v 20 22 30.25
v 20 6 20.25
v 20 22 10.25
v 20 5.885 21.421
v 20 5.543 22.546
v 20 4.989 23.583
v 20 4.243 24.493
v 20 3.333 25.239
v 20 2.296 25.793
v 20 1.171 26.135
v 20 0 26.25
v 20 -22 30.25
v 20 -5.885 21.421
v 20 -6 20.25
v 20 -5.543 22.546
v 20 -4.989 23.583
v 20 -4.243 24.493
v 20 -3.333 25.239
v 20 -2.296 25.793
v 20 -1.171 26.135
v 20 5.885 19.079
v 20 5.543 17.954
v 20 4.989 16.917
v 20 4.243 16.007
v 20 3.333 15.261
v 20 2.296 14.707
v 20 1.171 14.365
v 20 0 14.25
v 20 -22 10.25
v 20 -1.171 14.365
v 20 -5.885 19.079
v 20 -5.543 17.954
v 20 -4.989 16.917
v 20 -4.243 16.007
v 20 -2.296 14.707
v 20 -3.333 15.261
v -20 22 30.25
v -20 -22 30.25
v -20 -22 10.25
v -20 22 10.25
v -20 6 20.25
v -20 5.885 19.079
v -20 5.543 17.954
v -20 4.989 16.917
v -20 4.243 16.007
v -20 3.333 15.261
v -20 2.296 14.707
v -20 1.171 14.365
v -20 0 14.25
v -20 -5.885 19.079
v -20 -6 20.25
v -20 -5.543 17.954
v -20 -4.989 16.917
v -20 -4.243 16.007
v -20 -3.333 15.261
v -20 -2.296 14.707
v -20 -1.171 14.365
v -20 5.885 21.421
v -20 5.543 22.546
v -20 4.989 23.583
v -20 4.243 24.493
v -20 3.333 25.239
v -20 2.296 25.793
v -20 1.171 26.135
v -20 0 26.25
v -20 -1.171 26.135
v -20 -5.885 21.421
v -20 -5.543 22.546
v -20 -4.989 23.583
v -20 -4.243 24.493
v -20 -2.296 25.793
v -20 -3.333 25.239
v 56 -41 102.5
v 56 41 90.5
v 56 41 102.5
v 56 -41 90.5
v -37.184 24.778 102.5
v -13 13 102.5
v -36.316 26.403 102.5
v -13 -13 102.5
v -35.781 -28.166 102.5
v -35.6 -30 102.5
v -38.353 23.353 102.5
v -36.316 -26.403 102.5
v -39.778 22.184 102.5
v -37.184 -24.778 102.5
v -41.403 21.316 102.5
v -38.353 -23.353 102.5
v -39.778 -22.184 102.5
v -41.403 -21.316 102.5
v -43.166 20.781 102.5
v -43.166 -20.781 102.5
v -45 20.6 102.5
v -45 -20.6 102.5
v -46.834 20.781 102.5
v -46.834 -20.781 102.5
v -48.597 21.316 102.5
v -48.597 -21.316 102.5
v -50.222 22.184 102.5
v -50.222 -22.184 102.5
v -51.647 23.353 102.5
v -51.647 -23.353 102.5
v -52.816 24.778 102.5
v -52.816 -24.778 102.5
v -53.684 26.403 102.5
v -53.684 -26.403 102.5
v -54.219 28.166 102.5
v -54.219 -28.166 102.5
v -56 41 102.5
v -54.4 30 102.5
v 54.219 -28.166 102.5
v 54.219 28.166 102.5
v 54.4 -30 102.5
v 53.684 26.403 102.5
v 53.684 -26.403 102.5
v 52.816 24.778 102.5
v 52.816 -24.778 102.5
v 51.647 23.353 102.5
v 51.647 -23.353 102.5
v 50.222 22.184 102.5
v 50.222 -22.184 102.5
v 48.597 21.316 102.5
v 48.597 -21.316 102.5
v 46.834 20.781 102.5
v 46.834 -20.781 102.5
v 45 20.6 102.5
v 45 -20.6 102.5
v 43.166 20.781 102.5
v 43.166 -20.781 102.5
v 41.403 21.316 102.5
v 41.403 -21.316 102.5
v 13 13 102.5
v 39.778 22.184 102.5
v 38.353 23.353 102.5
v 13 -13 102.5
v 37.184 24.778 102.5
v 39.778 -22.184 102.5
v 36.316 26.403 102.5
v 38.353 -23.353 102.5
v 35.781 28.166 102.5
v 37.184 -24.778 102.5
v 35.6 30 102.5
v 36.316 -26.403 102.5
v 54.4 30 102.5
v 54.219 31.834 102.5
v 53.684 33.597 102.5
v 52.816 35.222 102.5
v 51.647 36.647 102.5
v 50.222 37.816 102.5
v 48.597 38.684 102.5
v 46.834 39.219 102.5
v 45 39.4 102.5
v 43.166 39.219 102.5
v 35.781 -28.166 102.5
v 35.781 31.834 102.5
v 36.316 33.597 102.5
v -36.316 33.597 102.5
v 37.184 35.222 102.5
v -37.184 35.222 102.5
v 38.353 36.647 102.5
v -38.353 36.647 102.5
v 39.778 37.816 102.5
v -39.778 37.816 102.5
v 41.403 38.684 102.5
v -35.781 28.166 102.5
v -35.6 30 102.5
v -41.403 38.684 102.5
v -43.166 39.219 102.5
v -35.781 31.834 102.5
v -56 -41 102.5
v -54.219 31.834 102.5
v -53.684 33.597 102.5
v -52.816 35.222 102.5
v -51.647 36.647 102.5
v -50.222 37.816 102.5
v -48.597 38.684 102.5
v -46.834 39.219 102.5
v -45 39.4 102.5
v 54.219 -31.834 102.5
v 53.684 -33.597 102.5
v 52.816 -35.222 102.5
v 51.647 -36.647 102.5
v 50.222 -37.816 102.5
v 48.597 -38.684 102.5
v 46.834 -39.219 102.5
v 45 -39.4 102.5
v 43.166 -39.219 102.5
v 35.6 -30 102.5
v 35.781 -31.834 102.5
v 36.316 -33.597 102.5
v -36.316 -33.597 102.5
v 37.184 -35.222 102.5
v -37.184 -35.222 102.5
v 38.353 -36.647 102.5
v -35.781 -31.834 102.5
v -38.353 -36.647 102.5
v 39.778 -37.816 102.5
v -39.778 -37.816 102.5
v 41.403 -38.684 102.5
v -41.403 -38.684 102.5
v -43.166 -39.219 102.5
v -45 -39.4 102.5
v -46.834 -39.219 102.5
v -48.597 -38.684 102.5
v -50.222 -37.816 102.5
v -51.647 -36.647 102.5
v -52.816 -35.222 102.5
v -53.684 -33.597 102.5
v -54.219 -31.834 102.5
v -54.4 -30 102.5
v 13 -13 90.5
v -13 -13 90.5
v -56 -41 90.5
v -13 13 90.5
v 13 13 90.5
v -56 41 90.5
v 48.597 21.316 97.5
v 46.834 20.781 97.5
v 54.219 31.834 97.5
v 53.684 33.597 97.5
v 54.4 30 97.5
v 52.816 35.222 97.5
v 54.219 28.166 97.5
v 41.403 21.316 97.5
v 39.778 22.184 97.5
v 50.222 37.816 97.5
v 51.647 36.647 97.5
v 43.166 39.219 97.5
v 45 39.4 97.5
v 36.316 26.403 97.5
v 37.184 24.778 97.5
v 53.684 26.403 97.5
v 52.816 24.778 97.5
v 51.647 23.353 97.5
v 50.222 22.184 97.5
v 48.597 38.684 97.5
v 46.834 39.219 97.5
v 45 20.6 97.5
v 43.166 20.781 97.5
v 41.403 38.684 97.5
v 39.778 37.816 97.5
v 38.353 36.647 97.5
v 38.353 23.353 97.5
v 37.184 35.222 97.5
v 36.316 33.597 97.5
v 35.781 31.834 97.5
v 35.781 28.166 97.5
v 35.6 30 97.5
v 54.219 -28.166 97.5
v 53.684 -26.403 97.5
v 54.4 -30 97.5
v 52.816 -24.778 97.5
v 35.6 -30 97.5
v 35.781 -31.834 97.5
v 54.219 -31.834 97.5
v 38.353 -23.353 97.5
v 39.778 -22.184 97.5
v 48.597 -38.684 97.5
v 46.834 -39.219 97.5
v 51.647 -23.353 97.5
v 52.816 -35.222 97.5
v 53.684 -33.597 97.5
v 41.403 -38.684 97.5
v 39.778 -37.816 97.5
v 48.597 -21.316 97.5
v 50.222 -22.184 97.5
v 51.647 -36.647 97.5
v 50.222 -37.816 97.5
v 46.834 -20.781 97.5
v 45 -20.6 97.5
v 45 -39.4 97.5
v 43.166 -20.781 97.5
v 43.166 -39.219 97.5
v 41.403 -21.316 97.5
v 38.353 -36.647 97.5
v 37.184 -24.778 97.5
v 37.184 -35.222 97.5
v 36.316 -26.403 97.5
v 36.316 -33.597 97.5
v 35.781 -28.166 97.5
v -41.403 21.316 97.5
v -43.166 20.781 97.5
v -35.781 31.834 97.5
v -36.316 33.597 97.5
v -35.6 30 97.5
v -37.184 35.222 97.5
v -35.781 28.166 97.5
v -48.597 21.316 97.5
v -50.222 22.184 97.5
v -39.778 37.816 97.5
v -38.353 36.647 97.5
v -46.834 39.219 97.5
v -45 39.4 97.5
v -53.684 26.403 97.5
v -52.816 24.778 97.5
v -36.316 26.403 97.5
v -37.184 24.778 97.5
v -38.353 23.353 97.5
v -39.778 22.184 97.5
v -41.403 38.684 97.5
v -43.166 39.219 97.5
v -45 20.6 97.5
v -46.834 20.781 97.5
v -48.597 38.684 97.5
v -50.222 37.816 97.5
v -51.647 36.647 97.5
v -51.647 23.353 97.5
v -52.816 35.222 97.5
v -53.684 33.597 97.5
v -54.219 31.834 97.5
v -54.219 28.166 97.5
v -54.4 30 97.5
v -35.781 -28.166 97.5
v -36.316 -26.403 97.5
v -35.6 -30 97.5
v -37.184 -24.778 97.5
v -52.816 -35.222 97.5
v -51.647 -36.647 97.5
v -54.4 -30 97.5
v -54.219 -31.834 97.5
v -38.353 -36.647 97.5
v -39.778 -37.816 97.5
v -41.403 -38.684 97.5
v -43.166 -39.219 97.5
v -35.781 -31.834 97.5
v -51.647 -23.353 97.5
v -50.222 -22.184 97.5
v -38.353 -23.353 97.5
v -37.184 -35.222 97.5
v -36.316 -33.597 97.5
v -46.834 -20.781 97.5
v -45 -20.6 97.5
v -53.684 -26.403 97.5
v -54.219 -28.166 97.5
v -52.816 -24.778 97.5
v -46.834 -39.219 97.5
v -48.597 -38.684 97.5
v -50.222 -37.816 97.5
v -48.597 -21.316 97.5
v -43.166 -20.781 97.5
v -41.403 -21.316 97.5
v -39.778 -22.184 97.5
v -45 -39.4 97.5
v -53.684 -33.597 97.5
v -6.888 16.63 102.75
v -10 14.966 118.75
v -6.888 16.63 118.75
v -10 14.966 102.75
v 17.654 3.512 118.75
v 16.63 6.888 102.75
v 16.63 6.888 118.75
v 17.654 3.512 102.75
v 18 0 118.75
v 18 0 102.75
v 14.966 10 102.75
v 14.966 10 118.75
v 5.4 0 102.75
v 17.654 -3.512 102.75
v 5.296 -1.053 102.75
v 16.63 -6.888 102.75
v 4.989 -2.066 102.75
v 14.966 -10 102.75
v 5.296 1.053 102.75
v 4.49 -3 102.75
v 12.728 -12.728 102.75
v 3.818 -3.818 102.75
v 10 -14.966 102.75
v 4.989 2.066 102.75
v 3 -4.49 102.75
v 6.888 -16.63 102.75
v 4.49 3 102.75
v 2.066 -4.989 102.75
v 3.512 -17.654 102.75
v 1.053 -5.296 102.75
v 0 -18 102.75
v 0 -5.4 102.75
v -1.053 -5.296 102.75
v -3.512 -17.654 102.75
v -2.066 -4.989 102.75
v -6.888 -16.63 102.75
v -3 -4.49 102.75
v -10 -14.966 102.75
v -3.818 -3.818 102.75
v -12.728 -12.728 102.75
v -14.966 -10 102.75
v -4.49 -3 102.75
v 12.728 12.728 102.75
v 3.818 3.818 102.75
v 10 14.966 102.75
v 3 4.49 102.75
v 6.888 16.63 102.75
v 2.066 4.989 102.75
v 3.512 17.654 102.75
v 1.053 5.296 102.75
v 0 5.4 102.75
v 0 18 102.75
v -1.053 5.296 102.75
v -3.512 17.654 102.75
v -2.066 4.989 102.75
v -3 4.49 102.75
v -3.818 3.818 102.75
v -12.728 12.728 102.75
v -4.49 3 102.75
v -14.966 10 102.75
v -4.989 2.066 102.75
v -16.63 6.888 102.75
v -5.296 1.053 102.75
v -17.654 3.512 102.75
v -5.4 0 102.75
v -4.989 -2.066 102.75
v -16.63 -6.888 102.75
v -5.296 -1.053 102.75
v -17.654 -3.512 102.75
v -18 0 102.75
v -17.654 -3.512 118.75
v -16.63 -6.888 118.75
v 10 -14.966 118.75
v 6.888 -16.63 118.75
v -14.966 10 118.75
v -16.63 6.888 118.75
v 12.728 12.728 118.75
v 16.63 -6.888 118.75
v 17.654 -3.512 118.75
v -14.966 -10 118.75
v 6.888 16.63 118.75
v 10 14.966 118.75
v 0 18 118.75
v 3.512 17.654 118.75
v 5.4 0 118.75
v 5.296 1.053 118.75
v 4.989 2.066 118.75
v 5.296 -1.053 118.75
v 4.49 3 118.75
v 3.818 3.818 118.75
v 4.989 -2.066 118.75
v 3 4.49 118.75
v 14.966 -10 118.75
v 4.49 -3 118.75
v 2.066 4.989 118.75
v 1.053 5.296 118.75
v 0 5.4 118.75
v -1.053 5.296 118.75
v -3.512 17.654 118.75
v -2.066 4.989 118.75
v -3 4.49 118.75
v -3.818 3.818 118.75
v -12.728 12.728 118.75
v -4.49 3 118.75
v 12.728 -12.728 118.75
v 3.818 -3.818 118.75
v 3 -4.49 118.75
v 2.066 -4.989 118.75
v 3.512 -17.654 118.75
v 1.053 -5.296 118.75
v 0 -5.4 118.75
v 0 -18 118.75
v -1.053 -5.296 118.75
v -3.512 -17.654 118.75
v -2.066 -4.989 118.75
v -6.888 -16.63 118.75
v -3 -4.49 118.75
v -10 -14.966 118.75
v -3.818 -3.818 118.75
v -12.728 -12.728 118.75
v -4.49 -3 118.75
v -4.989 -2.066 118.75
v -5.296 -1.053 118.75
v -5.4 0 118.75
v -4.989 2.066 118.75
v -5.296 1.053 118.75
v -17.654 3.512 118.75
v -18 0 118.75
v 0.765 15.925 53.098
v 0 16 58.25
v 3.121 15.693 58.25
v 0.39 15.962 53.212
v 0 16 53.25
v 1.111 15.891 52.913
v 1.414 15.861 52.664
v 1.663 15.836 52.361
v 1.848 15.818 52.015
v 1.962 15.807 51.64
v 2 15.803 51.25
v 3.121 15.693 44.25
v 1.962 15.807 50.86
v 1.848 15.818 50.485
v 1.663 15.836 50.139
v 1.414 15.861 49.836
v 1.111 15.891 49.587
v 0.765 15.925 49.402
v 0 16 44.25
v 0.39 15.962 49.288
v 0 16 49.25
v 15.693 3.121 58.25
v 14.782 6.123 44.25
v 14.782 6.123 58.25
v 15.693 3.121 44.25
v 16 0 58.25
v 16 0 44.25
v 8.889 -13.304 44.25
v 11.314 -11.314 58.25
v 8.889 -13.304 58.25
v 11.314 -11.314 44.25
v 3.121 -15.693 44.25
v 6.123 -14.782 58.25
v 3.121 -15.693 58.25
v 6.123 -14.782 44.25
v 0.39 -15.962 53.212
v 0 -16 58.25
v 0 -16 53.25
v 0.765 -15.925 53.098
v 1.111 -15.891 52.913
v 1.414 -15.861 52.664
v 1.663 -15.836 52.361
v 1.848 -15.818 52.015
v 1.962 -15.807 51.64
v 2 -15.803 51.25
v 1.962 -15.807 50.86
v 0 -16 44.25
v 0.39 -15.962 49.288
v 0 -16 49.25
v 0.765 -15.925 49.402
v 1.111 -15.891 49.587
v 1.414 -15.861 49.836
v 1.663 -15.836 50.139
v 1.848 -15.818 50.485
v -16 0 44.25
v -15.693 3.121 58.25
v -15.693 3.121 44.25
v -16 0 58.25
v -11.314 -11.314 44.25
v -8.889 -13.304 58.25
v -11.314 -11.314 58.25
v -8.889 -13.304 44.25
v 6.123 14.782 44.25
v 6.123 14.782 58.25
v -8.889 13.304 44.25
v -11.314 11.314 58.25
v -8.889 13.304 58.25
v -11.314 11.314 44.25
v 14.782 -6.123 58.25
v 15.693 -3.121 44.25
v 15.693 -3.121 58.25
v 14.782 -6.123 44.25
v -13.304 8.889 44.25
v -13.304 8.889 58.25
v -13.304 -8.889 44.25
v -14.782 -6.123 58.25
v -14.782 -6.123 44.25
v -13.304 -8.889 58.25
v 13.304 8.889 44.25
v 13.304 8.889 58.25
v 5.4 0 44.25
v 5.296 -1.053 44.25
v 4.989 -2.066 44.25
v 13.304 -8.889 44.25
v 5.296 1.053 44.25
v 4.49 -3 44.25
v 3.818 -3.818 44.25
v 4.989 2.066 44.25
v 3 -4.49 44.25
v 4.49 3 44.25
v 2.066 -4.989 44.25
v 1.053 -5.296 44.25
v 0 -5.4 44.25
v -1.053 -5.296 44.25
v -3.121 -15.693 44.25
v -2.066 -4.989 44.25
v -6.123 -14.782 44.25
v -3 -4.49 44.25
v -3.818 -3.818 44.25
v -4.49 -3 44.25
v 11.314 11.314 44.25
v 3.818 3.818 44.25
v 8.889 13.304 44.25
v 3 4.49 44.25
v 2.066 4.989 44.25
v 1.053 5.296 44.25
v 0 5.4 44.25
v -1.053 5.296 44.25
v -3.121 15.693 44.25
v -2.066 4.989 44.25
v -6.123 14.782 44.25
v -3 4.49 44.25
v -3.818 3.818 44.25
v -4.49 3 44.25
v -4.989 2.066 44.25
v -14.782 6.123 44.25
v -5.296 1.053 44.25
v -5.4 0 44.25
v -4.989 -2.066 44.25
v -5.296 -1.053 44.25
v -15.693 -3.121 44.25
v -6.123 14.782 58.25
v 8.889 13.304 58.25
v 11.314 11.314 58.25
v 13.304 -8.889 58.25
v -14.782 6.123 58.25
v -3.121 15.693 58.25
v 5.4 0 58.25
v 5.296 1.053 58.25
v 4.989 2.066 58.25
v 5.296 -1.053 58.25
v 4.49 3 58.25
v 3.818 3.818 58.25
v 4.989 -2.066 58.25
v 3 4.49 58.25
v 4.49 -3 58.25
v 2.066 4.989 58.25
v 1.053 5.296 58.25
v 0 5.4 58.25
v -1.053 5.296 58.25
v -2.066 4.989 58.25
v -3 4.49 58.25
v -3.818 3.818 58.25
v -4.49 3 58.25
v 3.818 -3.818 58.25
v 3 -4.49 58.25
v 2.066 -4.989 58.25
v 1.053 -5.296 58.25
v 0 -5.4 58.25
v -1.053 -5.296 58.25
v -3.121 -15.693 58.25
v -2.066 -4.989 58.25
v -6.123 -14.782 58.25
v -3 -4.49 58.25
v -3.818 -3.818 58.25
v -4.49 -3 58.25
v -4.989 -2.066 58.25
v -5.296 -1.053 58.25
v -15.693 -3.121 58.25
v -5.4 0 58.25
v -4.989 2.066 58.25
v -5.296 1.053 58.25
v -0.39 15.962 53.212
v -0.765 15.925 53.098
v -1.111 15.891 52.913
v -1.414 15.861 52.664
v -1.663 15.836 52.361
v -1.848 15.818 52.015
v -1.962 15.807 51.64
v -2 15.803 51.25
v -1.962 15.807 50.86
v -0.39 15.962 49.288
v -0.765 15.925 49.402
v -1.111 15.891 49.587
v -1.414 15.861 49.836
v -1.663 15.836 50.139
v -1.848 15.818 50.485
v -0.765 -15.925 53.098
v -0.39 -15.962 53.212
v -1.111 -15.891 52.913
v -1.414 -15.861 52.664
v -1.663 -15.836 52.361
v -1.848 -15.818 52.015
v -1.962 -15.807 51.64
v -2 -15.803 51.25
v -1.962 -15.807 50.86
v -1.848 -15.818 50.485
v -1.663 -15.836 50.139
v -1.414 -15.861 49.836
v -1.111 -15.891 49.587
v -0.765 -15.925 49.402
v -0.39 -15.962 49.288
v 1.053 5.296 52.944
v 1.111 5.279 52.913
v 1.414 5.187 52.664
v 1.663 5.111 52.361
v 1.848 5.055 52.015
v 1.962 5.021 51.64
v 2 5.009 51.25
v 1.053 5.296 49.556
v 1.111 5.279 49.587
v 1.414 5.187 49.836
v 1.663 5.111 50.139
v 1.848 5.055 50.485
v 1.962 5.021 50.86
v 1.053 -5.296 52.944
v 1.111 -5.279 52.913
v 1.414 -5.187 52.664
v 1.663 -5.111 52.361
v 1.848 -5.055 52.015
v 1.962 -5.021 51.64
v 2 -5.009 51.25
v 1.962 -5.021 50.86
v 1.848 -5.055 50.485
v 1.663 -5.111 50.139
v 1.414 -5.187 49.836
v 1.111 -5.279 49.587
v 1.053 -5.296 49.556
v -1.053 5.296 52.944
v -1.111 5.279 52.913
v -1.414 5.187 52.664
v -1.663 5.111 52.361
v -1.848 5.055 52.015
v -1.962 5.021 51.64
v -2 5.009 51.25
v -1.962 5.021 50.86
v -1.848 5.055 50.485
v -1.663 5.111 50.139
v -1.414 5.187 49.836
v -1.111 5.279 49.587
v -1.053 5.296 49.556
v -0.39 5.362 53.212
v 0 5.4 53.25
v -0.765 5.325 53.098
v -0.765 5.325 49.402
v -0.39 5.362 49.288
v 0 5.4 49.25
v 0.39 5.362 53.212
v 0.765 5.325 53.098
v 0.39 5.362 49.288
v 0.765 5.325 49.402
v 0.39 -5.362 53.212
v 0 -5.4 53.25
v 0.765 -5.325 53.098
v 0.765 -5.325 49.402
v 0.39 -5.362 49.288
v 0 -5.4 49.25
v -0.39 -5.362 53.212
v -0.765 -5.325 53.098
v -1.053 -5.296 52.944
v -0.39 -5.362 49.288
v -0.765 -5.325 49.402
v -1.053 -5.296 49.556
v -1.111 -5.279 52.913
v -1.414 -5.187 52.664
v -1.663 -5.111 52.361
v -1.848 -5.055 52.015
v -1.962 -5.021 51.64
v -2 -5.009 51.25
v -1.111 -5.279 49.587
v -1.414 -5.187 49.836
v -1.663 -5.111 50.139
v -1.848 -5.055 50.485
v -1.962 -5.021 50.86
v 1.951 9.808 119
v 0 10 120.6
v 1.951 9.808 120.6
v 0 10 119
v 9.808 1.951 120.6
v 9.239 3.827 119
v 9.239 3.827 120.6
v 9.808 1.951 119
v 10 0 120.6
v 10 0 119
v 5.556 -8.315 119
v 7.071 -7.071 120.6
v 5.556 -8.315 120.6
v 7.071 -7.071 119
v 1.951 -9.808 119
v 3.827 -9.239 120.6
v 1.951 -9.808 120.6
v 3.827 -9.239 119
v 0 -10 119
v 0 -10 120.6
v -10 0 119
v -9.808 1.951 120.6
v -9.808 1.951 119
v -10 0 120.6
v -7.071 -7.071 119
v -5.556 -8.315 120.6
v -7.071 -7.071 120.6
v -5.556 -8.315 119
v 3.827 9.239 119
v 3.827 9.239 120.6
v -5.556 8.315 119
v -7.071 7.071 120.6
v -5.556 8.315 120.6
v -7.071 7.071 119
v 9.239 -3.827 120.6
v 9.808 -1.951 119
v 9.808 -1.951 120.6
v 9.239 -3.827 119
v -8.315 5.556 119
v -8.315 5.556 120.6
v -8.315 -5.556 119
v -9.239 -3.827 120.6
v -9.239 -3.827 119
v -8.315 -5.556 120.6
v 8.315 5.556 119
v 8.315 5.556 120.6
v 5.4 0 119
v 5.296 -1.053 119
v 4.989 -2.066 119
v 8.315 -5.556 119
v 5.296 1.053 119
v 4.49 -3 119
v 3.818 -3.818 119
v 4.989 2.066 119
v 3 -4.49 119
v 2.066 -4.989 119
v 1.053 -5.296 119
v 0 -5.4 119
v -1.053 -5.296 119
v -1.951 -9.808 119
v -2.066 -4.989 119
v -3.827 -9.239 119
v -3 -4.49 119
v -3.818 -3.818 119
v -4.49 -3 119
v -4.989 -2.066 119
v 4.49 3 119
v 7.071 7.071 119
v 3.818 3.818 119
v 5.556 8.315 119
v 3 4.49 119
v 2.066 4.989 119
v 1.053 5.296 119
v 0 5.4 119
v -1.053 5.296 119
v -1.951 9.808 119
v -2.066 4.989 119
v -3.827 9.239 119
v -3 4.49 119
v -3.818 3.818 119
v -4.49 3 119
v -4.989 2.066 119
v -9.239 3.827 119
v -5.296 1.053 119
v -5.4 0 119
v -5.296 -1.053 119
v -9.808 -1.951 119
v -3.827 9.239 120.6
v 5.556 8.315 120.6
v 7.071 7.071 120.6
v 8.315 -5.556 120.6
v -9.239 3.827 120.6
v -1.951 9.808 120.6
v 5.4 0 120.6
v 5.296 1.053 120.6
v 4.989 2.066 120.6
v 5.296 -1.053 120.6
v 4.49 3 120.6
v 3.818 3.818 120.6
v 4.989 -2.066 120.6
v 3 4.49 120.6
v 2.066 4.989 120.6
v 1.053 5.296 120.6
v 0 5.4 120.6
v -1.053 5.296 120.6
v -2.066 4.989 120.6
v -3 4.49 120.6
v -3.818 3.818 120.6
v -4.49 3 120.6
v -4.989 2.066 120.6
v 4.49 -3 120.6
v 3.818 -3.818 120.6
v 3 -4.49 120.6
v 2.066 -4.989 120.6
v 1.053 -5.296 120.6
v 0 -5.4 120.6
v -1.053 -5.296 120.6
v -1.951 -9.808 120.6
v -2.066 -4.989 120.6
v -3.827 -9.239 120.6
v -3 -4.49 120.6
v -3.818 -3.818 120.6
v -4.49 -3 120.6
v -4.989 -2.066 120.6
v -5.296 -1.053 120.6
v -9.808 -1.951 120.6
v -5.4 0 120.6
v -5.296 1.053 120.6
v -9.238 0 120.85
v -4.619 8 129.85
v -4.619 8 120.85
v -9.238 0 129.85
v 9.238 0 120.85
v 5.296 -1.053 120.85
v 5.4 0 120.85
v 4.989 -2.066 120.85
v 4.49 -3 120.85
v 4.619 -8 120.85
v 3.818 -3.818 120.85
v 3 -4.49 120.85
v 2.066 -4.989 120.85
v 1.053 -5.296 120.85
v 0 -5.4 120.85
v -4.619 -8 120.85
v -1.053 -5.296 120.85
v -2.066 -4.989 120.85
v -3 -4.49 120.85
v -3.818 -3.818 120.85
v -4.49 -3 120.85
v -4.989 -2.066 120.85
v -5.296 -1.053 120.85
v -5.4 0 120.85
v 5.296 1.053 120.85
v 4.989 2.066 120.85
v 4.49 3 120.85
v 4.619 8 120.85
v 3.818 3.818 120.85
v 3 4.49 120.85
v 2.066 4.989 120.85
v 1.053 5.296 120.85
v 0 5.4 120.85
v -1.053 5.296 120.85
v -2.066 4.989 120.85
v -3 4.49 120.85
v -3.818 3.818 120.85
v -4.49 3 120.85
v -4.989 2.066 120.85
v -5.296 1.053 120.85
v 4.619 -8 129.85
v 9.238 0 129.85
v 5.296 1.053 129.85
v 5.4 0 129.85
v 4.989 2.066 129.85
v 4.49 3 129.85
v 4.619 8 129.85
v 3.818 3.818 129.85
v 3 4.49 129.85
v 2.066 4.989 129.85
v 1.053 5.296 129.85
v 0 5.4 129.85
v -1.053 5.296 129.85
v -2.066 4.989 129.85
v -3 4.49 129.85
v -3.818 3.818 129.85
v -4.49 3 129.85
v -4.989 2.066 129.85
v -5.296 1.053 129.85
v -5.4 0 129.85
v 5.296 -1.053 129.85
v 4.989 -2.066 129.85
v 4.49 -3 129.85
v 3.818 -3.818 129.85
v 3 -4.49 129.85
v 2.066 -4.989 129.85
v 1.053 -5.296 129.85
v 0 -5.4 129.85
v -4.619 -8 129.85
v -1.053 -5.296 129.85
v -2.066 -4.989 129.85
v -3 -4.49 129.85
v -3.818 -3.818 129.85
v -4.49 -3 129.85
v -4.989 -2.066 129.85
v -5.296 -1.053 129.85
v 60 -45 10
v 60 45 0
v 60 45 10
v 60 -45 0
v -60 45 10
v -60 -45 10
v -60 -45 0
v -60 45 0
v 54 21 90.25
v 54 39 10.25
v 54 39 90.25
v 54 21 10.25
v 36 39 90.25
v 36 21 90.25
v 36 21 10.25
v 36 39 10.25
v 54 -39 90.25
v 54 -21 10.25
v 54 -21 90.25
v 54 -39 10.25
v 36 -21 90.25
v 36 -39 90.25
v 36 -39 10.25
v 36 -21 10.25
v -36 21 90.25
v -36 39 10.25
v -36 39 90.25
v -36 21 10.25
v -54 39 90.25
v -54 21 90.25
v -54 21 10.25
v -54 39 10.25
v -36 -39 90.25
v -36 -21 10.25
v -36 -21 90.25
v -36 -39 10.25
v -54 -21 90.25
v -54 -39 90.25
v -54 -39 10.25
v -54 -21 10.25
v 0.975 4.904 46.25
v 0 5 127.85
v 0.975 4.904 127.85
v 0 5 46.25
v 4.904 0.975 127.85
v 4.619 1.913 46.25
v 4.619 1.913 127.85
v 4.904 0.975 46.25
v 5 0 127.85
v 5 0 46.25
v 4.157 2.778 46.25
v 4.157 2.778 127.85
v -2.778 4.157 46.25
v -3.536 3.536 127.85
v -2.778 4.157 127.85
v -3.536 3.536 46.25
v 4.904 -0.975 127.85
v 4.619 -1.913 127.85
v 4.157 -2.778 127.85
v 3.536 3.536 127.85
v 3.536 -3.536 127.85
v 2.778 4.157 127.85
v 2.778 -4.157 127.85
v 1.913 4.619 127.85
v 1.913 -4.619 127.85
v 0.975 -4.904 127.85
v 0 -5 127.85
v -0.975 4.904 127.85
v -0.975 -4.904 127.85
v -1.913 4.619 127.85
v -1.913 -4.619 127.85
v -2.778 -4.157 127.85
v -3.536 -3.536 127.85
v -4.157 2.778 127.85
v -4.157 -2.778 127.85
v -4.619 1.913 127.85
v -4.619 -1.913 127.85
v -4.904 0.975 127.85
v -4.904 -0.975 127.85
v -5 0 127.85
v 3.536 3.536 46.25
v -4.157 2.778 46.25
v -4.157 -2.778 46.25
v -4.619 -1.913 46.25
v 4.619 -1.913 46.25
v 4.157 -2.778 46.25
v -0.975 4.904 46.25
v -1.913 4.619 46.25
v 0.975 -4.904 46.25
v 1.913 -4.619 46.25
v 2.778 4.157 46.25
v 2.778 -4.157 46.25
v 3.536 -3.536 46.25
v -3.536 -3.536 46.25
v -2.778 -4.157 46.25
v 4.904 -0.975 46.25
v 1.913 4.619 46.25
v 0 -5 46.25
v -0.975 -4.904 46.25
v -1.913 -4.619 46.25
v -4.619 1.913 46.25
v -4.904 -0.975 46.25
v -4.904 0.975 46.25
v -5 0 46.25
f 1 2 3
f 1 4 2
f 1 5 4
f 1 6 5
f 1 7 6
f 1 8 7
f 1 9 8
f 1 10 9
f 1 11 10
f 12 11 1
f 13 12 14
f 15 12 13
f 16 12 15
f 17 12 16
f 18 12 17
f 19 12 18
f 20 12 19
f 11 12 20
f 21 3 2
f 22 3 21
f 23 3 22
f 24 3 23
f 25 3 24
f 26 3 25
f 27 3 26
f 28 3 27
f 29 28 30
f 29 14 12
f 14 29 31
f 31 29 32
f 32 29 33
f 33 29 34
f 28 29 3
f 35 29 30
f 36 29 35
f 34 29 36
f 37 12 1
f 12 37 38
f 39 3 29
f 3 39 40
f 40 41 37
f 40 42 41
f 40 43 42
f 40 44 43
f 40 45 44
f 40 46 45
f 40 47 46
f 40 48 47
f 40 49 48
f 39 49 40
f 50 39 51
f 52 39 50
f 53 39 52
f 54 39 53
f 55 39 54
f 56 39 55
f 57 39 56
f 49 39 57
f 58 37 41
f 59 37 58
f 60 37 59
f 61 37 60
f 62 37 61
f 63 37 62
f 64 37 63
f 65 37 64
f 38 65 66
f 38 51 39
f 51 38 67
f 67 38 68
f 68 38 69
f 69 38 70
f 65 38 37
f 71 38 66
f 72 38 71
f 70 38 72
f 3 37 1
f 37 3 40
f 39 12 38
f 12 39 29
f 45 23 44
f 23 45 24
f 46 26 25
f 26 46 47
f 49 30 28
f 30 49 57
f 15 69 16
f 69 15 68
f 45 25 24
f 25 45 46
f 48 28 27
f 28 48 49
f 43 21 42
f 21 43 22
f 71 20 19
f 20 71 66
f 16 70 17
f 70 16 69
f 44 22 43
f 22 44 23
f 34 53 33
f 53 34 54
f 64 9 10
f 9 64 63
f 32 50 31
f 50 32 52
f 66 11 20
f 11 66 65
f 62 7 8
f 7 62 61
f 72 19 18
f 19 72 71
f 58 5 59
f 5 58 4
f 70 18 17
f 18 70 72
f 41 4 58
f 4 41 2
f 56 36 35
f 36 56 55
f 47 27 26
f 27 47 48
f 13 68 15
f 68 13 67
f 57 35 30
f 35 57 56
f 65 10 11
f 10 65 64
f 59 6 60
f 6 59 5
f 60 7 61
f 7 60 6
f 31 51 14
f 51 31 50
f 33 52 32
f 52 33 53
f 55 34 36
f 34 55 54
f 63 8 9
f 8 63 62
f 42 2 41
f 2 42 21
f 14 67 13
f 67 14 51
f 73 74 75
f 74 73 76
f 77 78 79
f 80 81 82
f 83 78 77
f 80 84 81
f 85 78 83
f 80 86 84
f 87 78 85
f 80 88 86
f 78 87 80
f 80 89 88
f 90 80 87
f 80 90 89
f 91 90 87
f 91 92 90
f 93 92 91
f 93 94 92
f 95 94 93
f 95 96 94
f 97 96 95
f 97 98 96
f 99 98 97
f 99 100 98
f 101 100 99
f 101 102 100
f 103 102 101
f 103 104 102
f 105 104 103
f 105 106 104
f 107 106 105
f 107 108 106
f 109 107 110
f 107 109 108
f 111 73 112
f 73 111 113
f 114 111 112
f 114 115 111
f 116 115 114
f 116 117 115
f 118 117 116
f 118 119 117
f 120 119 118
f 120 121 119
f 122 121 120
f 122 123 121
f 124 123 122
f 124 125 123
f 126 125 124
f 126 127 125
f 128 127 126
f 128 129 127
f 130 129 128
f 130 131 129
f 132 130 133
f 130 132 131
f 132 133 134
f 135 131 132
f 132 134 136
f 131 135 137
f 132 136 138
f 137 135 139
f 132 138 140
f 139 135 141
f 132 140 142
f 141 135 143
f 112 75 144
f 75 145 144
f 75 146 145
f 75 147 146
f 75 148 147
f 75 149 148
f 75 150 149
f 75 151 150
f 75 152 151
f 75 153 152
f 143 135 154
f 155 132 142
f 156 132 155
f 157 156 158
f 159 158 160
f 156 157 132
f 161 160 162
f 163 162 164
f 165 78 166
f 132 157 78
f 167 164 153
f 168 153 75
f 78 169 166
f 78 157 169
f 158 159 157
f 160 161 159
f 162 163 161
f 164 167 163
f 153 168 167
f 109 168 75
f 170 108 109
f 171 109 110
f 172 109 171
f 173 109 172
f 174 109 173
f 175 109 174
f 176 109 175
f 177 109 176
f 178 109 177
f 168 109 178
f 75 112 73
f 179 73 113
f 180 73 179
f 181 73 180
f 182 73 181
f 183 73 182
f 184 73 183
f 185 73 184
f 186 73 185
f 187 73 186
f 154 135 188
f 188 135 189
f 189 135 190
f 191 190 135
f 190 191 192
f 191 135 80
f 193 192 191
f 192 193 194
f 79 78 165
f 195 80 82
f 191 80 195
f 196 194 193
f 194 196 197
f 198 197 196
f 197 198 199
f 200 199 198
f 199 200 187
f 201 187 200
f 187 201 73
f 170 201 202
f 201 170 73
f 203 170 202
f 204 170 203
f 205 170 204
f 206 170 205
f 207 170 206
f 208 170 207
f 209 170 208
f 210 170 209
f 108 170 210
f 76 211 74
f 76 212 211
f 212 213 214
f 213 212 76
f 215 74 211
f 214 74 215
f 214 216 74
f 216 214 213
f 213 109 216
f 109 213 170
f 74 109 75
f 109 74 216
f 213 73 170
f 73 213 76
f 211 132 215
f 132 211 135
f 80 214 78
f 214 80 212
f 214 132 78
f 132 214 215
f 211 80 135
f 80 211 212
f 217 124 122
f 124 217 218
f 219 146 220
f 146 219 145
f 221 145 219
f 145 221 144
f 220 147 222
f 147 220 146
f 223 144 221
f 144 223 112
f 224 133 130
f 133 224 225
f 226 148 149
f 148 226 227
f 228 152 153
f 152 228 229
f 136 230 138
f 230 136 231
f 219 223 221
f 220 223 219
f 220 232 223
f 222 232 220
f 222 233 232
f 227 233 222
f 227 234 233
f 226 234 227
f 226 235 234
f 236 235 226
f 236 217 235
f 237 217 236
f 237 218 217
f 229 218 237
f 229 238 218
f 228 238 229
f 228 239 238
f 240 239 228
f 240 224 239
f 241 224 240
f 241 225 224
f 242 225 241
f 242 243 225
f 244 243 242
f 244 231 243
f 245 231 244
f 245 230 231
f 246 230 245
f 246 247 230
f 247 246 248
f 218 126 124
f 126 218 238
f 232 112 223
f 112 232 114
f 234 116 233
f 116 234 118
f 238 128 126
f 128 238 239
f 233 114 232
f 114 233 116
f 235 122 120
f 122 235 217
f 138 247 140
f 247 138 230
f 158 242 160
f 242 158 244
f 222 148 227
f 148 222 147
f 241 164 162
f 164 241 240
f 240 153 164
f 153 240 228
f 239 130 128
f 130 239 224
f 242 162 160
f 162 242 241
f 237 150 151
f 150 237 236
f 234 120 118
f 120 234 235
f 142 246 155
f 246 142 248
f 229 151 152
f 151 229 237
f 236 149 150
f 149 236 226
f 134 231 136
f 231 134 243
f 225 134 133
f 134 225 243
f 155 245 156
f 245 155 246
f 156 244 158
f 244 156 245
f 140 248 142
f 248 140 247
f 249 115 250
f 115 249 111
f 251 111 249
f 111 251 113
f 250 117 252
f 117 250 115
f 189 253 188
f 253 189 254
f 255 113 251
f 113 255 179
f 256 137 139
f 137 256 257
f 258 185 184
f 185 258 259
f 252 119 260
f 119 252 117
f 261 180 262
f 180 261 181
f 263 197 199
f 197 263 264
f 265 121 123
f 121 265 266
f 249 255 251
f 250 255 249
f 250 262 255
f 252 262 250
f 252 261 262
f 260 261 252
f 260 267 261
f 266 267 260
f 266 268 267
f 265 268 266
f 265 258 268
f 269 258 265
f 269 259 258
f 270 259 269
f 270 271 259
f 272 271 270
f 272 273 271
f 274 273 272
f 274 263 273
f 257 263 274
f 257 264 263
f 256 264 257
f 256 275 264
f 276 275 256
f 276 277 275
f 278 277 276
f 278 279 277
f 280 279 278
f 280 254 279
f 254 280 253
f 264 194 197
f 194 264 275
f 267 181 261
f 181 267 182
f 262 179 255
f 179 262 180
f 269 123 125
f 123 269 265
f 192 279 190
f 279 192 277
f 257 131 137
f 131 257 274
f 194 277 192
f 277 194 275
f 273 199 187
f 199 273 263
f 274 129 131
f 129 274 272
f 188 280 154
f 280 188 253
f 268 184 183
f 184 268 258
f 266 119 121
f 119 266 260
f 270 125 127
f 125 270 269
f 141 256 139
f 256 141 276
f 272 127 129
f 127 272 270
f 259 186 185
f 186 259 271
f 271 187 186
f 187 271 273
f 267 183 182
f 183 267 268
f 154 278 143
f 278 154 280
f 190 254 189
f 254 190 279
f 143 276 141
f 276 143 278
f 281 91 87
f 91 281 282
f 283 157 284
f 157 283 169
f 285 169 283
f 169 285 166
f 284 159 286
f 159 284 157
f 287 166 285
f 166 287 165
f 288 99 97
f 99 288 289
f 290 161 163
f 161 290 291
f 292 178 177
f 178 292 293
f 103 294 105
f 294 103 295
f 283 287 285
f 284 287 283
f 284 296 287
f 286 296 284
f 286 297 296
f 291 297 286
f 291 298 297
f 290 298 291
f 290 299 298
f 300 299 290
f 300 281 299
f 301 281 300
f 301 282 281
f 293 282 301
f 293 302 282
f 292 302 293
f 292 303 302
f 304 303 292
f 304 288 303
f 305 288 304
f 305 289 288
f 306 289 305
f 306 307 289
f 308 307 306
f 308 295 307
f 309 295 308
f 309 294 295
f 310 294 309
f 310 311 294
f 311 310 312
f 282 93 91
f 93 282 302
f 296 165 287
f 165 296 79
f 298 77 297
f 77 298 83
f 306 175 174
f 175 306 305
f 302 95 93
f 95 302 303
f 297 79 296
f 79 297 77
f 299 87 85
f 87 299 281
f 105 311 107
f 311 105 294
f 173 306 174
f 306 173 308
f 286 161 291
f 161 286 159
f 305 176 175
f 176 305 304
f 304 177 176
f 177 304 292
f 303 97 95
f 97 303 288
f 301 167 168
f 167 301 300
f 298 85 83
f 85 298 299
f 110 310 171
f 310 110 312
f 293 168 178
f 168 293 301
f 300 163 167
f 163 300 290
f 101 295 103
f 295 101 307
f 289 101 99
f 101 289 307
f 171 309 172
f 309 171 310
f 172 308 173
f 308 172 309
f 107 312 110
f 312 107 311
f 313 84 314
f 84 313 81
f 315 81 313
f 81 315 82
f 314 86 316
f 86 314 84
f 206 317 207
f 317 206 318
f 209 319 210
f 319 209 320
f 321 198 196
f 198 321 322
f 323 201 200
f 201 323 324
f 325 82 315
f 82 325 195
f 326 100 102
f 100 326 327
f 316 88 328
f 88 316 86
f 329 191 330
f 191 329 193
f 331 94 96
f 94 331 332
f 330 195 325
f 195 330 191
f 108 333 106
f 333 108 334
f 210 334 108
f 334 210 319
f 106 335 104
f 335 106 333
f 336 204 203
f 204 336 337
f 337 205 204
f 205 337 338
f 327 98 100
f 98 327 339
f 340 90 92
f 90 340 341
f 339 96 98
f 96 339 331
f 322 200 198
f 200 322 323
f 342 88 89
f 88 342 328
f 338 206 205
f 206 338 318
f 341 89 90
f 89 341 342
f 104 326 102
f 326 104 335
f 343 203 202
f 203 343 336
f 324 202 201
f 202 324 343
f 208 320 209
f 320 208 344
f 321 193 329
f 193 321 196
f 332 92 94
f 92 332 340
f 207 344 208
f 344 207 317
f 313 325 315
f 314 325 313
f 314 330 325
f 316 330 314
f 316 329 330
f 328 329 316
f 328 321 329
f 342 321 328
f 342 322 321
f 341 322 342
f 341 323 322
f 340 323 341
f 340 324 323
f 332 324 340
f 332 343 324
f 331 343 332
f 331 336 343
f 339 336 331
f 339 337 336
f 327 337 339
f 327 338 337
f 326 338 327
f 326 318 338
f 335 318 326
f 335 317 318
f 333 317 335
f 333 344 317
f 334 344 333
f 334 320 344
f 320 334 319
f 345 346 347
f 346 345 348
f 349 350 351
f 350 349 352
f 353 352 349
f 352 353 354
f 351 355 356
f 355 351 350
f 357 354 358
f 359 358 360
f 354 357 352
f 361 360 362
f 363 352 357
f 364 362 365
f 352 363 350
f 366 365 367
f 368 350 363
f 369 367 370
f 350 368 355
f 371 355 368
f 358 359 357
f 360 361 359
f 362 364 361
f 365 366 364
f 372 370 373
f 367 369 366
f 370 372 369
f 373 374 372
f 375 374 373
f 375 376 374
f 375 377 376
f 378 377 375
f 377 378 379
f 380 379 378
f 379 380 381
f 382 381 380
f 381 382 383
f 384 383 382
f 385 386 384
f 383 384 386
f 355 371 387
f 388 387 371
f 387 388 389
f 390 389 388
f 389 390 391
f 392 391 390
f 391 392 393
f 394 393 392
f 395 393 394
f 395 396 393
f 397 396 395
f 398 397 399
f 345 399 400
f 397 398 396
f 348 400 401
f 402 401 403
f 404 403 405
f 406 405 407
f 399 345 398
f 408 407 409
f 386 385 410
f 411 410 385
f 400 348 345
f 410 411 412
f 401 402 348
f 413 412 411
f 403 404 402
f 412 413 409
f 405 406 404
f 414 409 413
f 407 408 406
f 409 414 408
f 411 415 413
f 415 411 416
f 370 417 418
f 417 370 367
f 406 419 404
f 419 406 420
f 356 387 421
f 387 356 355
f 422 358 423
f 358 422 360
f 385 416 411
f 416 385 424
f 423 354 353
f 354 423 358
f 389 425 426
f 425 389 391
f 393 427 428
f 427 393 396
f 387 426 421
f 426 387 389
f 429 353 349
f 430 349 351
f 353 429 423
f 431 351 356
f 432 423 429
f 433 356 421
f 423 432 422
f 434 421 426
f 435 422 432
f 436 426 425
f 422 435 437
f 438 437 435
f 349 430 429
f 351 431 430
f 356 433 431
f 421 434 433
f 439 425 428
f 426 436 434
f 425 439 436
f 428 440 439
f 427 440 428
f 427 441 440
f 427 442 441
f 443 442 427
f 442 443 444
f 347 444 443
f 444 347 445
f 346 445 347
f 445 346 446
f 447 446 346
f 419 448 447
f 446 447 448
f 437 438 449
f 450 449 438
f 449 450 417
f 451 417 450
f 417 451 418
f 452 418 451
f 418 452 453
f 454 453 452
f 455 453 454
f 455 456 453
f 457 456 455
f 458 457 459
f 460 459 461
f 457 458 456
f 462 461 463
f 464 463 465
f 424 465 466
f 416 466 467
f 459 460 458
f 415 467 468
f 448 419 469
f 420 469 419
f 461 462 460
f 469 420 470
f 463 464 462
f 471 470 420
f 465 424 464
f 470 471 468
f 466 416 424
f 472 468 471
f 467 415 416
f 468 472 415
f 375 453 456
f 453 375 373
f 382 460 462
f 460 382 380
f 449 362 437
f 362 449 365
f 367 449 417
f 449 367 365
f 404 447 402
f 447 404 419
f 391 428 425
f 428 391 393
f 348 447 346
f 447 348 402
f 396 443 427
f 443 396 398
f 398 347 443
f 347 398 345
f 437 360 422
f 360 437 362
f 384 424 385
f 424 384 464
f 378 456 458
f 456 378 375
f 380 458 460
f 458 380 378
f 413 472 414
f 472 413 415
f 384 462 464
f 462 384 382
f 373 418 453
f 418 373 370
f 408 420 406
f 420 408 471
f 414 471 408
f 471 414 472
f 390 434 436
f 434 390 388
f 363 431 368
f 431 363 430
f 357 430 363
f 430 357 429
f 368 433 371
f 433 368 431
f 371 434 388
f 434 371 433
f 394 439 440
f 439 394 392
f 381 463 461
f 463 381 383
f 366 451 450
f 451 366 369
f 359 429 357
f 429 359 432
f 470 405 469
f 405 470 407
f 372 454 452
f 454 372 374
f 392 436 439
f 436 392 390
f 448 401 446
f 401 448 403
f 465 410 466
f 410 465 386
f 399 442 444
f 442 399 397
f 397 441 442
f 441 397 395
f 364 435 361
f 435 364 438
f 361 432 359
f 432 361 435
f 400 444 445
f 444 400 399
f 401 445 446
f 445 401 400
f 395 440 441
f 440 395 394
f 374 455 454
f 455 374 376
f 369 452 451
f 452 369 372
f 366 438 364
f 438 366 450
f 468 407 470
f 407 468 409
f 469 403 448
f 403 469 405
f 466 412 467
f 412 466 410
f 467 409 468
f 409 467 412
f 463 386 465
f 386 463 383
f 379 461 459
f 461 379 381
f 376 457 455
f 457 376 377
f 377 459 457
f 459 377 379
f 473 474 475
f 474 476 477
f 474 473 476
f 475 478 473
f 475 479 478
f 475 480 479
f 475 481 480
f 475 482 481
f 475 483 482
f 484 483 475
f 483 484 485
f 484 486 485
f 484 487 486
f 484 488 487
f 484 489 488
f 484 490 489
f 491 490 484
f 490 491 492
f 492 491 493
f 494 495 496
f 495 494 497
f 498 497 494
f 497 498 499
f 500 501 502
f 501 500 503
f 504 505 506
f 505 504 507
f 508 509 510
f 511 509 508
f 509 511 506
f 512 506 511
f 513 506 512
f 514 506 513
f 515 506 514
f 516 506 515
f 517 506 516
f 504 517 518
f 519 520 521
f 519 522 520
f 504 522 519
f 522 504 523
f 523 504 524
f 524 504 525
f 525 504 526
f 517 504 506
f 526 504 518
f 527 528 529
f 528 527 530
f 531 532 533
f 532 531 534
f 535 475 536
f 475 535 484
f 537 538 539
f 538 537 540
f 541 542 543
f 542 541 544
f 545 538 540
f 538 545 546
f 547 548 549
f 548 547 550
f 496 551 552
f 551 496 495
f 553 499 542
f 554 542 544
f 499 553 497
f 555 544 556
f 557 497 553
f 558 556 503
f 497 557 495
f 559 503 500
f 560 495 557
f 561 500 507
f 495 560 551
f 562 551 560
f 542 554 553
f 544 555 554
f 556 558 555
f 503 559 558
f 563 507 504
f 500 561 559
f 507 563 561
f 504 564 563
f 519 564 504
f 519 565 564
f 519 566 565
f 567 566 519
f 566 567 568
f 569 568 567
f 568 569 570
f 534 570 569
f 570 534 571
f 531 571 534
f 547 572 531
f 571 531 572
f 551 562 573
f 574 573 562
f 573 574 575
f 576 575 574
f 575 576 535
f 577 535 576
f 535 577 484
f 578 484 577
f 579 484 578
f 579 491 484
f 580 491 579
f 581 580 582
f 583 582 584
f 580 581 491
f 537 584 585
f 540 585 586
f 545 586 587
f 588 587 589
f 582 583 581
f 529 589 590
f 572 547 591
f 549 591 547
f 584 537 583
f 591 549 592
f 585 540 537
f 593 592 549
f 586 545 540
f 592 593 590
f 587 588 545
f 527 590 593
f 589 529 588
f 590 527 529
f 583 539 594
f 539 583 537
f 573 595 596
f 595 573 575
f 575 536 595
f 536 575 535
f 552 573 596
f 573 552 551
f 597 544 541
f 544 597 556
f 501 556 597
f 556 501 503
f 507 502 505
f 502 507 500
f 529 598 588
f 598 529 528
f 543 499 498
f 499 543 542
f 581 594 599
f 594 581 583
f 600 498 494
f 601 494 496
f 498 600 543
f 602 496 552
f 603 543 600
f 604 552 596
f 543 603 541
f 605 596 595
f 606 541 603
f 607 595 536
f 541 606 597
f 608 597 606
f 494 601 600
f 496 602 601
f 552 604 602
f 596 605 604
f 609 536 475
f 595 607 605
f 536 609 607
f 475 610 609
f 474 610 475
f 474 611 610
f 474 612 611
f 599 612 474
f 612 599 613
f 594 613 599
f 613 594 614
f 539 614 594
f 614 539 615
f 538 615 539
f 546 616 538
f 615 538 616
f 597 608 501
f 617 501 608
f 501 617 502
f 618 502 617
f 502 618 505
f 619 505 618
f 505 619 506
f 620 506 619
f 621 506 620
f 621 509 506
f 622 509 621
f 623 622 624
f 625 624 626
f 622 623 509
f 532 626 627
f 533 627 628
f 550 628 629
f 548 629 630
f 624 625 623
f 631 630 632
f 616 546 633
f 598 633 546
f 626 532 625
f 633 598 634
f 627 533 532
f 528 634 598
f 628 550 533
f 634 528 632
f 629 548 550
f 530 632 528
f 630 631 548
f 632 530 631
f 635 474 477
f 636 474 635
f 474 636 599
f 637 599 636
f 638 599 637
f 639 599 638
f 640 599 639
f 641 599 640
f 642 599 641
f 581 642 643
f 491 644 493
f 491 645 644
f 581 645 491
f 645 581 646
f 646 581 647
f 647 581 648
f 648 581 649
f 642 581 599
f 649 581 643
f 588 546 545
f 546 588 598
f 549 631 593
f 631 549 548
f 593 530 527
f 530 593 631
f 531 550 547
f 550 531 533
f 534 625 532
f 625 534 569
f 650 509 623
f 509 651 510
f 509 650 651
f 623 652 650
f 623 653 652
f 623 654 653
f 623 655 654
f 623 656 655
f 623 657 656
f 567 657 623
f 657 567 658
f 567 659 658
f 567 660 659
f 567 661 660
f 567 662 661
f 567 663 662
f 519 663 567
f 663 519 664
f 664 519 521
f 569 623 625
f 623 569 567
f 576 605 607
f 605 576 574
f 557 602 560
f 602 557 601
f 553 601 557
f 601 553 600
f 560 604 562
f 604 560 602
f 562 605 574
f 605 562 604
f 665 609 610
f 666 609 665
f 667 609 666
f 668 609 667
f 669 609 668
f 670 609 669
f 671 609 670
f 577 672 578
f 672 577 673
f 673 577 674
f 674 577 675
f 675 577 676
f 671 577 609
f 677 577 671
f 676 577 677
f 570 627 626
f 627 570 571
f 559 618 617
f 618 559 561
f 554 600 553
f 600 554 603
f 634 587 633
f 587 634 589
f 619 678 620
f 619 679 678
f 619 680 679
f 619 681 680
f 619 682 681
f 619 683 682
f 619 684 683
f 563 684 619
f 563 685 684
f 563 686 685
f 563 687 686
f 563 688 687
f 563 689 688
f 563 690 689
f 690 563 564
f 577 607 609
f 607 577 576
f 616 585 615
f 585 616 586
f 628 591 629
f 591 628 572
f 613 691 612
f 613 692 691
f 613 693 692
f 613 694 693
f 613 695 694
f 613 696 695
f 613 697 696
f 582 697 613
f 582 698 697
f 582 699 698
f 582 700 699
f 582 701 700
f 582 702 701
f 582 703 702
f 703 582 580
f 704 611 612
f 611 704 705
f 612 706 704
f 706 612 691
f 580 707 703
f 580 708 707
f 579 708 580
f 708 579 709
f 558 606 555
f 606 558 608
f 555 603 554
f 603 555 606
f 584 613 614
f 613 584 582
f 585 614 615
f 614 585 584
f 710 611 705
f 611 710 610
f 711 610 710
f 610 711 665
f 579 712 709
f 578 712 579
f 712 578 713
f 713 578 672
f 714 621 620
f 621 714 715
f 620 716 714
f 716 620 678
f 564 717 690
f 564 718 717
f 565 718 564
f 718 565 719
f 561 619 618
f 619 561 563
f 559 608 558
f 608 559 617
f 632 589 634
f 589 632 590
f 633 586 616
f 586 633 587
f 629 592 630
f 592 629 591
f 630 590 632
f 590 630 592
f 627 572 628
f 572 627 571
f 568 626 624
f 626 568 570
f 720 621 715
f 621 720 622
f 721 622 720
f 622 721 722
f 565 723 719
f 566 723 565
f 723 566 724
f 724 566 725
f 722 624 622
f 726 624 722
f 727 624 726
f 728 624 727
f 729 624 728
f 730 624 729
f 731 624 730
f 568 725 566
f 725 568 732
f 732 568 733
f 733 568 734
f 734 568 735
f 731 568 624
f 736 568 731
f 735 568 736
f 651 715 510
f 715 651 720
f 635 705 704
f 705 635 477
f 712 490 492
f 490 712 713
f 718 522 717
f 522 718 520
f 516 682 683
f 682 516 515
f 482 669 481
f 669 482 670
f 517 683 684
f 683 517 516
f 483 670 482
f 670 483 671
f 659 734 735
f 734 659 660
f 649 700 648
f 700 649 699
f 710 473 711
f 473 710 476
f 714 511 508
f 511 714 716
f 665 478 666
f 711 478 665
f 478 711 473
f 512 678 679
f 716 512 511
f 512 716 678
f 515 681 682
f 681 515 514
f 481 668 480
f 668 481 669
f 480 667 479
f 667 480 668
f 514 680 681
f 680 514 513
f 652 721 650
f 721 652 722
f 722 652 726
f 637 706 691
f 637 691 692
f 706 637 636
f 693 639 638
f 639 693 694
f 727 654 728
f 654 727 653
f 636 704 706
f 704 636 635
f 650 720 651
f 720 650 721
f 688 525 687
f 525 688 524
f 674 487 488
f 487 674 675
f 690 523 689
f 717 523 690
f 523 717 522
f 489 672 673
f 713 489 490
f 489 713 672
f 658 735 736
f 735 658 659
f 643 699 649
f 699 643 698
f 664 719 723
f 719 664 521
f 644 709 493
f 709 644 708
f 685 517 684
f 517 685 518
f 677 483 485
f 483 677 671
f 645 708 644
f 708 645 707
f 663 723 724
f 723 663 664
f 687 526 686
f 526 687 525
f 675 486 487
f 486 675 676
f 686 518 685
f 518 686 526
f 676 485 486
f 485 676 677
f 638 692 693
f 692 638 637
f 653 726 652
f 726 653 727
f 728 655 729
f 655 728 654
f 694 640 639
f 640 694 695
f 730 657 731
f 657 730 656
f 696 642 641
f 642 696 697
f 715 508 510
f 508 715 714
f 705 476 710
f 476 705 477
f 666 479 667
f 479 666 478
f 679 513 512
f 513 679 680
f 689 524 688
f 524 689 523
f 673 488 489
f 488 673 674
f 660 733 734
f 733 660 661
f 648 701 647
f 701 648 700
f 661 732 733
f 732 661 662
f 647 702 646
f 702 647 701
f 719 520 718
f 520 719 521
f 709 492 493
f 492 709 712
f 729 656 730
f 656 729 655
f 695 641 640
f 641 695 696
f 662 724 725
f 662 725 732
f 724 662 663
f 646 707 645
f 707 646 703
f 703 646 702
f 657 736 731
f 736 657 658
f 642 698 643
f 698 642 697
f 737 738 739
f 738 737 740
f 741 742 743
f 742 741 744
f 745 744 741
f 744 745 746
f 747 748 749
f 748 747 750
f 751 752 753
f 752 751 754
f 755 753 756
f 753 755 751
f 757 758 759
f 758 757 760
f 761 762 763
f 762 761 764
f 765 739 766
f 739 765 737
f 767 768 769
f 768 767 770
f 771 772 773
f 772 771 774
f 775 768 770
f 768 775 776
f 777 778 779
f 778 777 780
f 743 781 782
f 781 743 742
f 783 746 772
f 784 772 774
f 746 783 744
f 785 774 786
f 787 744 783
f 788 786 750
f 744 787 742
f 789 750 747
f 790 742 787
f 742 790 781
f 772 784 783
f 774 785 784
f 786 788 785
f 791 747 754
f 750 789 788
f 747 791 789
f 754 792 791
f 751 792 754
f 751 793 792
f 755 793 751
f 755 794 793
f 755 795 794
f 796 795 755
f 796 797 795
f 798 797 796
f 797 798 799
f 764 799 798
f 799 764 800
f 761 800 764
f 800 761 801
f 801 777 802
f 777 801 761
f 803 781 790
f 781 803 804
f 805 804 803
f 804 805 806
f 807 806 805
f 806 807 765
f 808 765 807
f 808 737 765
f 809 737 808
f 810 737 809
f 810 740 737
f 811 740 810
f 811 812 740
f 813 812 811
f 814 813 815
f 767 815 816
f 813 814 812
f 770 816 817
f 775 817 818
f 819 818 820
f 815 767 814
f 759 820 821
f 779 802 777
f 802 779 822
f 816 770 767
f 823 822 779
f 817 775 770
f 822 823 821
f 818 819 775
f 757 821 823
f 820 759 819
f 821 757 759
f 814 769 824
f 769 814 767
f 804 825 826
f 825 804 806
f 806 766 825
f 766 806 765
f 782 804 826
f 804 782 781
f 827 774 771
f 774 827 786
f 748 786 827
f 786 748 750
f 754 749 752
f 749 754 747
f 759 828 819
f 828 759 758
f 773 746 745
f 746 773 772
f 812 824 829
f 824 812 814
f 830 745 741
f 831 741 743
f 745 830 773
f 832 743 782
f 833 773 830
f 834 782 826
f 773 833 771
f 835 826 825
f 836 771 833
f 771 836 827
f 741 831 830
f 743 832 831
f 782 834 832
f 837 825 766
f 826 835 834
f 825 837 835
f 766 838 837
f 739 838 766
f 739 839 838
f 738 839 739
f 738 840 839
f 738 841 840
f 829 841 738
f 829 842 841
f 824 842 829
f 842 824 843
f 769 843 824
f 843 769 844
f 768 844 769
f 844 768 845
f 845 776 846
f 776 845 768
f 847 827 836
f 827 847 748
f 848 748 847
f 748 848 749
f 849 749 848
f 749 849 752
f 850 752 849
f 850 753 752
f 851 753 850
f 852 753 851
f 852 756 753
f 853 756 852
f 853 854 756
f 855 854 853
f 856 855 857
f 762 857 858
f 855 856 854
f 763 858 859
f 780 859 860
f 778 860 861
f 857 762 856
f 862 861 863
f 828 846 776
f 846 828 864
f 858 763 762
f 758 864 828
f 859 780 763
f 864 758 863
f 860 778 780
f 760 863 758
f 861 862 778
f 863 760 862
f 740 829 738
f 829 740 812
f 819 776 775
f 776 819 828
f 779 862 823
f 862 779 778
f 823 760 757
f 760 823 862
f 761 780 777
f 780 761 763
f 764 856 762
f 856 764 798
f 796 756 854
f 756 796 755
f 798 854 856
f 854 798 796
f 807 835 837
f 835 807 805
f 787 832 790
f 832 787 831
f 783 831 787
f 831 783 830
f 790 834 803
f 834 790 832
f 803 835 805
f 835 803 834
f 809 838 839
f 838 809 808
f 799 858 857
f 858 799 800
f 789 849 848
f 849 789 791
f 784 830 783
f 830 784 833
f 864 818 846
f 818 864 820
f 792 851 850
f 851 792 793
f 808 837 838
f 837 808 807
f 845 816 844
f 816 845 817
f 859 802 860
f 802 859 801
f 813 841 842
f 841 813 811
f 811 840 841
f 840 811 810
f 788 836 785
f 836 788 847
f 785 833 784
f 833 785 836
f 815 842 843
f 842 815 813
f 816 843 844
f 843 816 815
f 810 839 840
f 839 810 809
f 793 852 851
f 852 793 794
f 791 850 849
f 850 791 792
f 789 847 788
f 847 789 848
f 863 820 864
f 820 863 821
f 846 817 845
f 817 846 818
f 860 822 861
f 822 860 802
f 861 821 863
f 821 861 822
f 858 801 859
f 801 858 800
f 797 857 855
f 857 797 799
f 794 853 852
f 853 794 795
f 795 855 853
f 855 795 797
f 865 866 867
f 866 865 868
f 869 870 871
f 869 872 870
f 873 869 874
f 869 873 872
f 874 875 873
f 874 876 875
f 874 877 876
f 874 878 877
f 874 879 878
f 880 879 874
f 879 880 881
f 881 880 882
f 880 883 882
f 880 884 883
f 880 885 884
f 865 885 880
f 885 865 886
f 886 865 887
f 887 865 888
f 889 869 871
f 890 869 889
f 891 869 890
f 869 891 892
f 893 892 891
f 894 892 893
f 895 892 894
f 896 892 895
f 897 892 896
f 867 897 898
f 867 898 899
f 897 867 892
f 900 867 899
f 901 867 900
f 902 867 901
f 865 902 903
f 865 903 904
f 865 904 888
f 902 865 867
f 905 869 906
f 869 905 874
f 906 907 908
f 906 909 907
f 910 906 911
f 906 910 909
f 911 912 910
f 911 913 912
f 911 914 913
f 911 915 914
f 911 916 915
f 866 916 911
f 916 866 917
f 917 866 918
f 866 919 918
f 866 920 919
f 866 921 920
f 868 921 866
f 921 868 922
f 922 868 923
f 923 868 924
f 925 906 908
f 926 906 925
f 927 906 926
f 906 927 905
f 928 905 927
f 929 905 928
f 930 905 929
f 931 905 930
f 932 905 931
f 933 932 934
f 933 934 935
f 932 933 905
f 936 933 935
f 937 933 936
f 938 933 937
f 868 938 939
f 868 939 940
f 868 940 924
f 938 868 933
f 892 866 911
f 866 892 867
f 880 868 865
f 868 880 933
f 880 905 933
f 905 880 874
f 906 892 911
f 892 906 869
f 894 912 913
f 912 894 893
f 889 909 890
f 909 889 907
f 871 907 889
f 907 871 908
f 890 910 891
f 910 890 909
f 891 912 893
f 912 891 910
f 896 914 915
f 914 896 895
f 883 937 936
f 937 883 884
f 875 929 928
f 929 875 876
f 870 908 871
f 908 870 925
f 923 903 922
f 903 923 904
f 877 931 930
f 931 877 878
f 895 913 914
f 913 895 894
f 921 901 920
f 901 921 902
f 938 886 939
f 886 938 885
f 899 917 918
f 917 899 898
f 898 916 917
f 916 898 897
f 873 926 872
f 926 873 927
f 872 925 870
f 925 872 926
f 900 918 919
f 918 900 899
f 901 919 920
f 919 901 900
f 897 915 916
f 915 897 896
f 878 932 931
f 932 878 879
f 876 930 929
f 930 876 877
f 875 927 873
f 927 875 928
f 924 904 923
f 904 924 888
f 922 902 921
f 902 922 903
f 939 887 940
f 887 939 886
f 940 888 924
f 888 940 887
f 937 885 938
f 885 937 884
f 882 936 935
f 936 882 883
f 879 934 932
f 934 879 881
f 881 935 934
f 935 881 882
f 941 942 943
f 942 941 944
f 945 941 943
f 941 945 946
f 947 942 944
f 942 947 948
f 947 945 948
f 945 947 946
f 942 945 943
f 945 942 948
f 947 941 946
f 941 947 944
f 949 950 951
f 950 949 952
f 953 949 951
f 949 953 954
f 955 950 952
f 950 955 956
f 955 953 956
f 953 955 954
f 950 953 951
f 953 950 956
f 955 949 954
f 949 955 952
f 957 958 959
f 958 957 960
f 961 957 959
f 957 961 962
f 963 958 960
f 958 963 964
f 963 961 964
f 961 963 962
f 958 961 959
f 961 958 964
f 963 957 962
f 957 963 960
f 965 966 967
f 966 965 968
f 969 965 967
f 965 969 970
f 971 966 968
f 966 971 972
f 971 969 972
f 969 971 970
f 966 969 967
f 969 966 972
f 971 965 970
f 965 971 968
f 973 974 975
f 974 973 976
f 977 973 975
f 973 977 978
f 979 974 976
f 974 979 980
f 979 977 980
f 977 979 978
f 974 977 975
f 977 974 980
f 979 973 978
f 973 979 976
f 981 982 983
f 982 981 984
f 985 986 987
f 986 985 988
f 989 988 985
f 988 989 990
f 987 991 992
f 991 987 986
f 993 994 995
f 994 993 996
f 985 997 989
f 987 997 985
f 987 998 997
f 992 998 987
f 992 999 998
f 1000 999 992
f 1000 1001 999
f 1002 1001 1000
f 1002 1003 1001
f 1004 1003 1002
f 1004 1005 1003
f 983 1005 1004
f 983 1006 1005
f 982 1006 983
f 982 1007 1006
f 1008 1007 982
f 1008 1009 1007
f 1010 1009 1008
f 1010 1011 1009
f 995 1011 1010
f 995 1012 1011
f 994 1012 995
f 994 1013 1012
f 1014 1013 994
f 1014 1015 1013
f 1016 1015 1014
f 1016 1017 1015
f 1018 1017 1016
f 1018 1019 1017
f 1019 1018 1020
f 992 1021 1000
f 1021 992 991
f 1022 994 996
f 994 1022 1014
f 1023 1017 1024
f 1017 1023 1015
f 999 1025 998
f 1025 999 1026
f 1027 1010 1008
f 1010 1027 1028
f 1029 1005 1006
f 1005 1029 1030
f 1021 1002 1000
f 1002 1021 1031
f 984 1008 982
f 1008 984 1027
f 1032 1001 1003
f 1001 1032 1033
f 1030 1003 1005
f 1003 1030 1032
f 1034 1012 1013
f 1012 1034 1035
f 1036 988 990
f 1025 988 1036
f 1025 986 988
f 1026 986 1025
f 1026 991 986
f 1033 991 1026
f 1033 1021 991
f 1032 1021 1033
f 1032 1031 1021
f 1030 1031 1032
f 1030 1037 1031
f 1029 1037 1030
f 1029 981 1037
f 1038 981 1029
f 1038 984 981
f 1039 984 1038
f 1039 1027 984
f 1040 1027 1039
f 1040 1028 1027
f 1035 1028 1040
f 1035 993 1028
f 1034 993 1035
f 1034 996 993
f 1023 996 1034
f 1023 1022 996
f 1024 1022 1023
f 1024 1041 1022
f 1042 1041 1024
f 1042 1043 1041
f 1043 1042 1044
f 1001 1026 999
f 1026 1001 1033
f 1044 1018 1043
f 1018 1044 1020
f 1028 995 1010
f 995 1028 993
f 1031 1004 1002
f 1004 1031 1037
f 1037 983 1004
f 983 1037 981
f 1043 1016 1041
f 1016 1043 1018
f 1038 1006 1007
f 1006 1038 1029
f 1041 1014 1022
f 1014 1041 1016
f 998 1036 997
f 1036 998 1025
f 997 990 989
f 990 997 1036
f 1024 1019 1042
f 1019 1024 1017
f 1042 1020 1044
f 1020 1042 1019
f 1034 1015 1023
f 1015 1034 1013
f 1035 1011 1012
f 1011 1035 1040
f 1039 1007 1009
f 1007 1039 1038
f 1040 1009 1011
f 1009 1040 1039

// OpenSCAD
$fn = 32;

// ------------------------------------------------------------------------
// Arbor press fixture: screw d10, posts 80 mm, gap 14 mm
// Every part is its own module, assembly() places every instance.
// ------------------------------------------------------------------------

// --- part 1 ---
module press_bed() {
  difference() {
    translate([-60, -45, 0]) cube([120, 90, 10]);
  }
}

// --- part 2 ---
module anvil_block() {
  difference() {
    translate([-20, -22, 0]) cube([40, 44, 20]);
    translate([0, 0, 10]) rotate([0, 90, 0]) cylinder(h = 42, d = 12, center = true);
  }
}

// --- part 3 ---
module press_post_a() {
  translate([-9, -9, 0]) cube([18, 18, 80]);
}

// --- part 4 ---
module press_post_b() {
  translate([-9, -9, 0]) cube([18, 18, 80]);
}

// --- part 5 ---
module press_post_c() {
  translate([-9, -9, 0]) cube([18, 18, 80]);
}

// --- part 6 ---
module press_post_d() {
  translate([-9, -9, 0]) cube([18, 18, 80]);
}

// --- part 7 ---
module press_frame() {
  difference() {
    translate([-56, -41, 0]) cube([112, 82, 12]);
    translate([-13, -13, -1]) cube([26, 26, 14]);
    translate([45, 30, 7]) cylinder(h = 6, d = 18.8);
    translate([45, -30, 7]) cylinder(h = 6, d = 18.8);
    translate([-45, 30, 7]) cylinder(h = 6, d = 18.8);
    translate([-45, -30, 7]) cylinder(h = 6, d = 18.8);
  }
}

// --- part 8 ---
module guide_ring() {
  difference() {
      translate([0, 0, 0]) cylinder(h = 16, d = 36);
      translate([0, 0, -1]) cylinder(h = 18, d = 10.8);
    }
}

// --- part 9 ---
module press_screw() {
  translate([0, 0, -40.8]) cylinder(h = 81.6, d = 10);
}

// --- part 10 ---
module press_head() {
  difference() {
    cylinder(h = 14, d = 32);
    translate([0, 0, -1]) cylinder(h = 16, d = 10.8);
    translate([0, 0, 7]) rotate([90, 0, 0]) cylinder(h = 34, d = 4, center = true);
  }
}

// --- part 11 ---
module nut_washer() {
  difference() {
      translate([0, 0, 0]) cylinder(h = 1.6, d = 20);
      translate([0, 0, -1]) cylinder(h = 3.6, d = 10.8);
    }
}

// --- part 12 ---
module press_nut() {
  difference() {
    linear_extrude(height = 9) polygon(points = [[9.238, 0], [4.619, 8], [-4.619, 8], [-9.238, 0], [-4.619, -8], [4.619, -8]]);
    translate([0, 0, -1]) cylinder(h = 11, d = 10.8);
  }
}

// --- assembly ---
module assembly() {
  color([0.80, 0.24, 0.20]) translate([0, 0, 0]) rotate([0, 0, 0]) press_bed();
  color([0.20, 0.45, 0.75]) translate([0, 0, 10.25]) rotate([0, 0, 0]) anvil_block();
  color([0.25, 0.62, 0.32]) translate([45, 30, 10.25]) rotate([0, 0, 0]) press_post_a();
  color([0.92, 0.70, 0.18]) translate([45, -30, 10.25]) rotate([0, 0, 0]) press_post_b();
  color([0.58, 0.35, 0.70]) translate([-45, 30, 10.25]) rotate([0, 0, 0]) press_post_c();
  color([0.16, 0.66, 0.66]) translate([-45, -30, 10.25]) rotate([0, 0, 0]) press_post_d();
  color([0.85, 0.48, 0.18]) translate([0, 0, 90.5]) rotate([0, 0, 0]) press_frame();
  color([0.55, 0.60, 0.65]) translate([0, 0, 102.75]) rotate([0, 0, 0]) guide_ring();
  color([0.75, 0.30, 0.55]) translate([0, 0, 87.05]) rotate([0, 0, 0]) press_screw();
  color([0.42, 0.52, 0.28]) translate([0, 0, 44.25]) rotate([0, 0, 0]) press_head();
  color([0.80, 0.24, 0.20]) translate([0, 0, 119]) rotate([0, 0, 0]) nut_washer();
  color([0.20, 0.45, 0.75]) translate([0, 0, 120.85]) rotate([0, 0, 0]) press_nut();
}

assembly();
